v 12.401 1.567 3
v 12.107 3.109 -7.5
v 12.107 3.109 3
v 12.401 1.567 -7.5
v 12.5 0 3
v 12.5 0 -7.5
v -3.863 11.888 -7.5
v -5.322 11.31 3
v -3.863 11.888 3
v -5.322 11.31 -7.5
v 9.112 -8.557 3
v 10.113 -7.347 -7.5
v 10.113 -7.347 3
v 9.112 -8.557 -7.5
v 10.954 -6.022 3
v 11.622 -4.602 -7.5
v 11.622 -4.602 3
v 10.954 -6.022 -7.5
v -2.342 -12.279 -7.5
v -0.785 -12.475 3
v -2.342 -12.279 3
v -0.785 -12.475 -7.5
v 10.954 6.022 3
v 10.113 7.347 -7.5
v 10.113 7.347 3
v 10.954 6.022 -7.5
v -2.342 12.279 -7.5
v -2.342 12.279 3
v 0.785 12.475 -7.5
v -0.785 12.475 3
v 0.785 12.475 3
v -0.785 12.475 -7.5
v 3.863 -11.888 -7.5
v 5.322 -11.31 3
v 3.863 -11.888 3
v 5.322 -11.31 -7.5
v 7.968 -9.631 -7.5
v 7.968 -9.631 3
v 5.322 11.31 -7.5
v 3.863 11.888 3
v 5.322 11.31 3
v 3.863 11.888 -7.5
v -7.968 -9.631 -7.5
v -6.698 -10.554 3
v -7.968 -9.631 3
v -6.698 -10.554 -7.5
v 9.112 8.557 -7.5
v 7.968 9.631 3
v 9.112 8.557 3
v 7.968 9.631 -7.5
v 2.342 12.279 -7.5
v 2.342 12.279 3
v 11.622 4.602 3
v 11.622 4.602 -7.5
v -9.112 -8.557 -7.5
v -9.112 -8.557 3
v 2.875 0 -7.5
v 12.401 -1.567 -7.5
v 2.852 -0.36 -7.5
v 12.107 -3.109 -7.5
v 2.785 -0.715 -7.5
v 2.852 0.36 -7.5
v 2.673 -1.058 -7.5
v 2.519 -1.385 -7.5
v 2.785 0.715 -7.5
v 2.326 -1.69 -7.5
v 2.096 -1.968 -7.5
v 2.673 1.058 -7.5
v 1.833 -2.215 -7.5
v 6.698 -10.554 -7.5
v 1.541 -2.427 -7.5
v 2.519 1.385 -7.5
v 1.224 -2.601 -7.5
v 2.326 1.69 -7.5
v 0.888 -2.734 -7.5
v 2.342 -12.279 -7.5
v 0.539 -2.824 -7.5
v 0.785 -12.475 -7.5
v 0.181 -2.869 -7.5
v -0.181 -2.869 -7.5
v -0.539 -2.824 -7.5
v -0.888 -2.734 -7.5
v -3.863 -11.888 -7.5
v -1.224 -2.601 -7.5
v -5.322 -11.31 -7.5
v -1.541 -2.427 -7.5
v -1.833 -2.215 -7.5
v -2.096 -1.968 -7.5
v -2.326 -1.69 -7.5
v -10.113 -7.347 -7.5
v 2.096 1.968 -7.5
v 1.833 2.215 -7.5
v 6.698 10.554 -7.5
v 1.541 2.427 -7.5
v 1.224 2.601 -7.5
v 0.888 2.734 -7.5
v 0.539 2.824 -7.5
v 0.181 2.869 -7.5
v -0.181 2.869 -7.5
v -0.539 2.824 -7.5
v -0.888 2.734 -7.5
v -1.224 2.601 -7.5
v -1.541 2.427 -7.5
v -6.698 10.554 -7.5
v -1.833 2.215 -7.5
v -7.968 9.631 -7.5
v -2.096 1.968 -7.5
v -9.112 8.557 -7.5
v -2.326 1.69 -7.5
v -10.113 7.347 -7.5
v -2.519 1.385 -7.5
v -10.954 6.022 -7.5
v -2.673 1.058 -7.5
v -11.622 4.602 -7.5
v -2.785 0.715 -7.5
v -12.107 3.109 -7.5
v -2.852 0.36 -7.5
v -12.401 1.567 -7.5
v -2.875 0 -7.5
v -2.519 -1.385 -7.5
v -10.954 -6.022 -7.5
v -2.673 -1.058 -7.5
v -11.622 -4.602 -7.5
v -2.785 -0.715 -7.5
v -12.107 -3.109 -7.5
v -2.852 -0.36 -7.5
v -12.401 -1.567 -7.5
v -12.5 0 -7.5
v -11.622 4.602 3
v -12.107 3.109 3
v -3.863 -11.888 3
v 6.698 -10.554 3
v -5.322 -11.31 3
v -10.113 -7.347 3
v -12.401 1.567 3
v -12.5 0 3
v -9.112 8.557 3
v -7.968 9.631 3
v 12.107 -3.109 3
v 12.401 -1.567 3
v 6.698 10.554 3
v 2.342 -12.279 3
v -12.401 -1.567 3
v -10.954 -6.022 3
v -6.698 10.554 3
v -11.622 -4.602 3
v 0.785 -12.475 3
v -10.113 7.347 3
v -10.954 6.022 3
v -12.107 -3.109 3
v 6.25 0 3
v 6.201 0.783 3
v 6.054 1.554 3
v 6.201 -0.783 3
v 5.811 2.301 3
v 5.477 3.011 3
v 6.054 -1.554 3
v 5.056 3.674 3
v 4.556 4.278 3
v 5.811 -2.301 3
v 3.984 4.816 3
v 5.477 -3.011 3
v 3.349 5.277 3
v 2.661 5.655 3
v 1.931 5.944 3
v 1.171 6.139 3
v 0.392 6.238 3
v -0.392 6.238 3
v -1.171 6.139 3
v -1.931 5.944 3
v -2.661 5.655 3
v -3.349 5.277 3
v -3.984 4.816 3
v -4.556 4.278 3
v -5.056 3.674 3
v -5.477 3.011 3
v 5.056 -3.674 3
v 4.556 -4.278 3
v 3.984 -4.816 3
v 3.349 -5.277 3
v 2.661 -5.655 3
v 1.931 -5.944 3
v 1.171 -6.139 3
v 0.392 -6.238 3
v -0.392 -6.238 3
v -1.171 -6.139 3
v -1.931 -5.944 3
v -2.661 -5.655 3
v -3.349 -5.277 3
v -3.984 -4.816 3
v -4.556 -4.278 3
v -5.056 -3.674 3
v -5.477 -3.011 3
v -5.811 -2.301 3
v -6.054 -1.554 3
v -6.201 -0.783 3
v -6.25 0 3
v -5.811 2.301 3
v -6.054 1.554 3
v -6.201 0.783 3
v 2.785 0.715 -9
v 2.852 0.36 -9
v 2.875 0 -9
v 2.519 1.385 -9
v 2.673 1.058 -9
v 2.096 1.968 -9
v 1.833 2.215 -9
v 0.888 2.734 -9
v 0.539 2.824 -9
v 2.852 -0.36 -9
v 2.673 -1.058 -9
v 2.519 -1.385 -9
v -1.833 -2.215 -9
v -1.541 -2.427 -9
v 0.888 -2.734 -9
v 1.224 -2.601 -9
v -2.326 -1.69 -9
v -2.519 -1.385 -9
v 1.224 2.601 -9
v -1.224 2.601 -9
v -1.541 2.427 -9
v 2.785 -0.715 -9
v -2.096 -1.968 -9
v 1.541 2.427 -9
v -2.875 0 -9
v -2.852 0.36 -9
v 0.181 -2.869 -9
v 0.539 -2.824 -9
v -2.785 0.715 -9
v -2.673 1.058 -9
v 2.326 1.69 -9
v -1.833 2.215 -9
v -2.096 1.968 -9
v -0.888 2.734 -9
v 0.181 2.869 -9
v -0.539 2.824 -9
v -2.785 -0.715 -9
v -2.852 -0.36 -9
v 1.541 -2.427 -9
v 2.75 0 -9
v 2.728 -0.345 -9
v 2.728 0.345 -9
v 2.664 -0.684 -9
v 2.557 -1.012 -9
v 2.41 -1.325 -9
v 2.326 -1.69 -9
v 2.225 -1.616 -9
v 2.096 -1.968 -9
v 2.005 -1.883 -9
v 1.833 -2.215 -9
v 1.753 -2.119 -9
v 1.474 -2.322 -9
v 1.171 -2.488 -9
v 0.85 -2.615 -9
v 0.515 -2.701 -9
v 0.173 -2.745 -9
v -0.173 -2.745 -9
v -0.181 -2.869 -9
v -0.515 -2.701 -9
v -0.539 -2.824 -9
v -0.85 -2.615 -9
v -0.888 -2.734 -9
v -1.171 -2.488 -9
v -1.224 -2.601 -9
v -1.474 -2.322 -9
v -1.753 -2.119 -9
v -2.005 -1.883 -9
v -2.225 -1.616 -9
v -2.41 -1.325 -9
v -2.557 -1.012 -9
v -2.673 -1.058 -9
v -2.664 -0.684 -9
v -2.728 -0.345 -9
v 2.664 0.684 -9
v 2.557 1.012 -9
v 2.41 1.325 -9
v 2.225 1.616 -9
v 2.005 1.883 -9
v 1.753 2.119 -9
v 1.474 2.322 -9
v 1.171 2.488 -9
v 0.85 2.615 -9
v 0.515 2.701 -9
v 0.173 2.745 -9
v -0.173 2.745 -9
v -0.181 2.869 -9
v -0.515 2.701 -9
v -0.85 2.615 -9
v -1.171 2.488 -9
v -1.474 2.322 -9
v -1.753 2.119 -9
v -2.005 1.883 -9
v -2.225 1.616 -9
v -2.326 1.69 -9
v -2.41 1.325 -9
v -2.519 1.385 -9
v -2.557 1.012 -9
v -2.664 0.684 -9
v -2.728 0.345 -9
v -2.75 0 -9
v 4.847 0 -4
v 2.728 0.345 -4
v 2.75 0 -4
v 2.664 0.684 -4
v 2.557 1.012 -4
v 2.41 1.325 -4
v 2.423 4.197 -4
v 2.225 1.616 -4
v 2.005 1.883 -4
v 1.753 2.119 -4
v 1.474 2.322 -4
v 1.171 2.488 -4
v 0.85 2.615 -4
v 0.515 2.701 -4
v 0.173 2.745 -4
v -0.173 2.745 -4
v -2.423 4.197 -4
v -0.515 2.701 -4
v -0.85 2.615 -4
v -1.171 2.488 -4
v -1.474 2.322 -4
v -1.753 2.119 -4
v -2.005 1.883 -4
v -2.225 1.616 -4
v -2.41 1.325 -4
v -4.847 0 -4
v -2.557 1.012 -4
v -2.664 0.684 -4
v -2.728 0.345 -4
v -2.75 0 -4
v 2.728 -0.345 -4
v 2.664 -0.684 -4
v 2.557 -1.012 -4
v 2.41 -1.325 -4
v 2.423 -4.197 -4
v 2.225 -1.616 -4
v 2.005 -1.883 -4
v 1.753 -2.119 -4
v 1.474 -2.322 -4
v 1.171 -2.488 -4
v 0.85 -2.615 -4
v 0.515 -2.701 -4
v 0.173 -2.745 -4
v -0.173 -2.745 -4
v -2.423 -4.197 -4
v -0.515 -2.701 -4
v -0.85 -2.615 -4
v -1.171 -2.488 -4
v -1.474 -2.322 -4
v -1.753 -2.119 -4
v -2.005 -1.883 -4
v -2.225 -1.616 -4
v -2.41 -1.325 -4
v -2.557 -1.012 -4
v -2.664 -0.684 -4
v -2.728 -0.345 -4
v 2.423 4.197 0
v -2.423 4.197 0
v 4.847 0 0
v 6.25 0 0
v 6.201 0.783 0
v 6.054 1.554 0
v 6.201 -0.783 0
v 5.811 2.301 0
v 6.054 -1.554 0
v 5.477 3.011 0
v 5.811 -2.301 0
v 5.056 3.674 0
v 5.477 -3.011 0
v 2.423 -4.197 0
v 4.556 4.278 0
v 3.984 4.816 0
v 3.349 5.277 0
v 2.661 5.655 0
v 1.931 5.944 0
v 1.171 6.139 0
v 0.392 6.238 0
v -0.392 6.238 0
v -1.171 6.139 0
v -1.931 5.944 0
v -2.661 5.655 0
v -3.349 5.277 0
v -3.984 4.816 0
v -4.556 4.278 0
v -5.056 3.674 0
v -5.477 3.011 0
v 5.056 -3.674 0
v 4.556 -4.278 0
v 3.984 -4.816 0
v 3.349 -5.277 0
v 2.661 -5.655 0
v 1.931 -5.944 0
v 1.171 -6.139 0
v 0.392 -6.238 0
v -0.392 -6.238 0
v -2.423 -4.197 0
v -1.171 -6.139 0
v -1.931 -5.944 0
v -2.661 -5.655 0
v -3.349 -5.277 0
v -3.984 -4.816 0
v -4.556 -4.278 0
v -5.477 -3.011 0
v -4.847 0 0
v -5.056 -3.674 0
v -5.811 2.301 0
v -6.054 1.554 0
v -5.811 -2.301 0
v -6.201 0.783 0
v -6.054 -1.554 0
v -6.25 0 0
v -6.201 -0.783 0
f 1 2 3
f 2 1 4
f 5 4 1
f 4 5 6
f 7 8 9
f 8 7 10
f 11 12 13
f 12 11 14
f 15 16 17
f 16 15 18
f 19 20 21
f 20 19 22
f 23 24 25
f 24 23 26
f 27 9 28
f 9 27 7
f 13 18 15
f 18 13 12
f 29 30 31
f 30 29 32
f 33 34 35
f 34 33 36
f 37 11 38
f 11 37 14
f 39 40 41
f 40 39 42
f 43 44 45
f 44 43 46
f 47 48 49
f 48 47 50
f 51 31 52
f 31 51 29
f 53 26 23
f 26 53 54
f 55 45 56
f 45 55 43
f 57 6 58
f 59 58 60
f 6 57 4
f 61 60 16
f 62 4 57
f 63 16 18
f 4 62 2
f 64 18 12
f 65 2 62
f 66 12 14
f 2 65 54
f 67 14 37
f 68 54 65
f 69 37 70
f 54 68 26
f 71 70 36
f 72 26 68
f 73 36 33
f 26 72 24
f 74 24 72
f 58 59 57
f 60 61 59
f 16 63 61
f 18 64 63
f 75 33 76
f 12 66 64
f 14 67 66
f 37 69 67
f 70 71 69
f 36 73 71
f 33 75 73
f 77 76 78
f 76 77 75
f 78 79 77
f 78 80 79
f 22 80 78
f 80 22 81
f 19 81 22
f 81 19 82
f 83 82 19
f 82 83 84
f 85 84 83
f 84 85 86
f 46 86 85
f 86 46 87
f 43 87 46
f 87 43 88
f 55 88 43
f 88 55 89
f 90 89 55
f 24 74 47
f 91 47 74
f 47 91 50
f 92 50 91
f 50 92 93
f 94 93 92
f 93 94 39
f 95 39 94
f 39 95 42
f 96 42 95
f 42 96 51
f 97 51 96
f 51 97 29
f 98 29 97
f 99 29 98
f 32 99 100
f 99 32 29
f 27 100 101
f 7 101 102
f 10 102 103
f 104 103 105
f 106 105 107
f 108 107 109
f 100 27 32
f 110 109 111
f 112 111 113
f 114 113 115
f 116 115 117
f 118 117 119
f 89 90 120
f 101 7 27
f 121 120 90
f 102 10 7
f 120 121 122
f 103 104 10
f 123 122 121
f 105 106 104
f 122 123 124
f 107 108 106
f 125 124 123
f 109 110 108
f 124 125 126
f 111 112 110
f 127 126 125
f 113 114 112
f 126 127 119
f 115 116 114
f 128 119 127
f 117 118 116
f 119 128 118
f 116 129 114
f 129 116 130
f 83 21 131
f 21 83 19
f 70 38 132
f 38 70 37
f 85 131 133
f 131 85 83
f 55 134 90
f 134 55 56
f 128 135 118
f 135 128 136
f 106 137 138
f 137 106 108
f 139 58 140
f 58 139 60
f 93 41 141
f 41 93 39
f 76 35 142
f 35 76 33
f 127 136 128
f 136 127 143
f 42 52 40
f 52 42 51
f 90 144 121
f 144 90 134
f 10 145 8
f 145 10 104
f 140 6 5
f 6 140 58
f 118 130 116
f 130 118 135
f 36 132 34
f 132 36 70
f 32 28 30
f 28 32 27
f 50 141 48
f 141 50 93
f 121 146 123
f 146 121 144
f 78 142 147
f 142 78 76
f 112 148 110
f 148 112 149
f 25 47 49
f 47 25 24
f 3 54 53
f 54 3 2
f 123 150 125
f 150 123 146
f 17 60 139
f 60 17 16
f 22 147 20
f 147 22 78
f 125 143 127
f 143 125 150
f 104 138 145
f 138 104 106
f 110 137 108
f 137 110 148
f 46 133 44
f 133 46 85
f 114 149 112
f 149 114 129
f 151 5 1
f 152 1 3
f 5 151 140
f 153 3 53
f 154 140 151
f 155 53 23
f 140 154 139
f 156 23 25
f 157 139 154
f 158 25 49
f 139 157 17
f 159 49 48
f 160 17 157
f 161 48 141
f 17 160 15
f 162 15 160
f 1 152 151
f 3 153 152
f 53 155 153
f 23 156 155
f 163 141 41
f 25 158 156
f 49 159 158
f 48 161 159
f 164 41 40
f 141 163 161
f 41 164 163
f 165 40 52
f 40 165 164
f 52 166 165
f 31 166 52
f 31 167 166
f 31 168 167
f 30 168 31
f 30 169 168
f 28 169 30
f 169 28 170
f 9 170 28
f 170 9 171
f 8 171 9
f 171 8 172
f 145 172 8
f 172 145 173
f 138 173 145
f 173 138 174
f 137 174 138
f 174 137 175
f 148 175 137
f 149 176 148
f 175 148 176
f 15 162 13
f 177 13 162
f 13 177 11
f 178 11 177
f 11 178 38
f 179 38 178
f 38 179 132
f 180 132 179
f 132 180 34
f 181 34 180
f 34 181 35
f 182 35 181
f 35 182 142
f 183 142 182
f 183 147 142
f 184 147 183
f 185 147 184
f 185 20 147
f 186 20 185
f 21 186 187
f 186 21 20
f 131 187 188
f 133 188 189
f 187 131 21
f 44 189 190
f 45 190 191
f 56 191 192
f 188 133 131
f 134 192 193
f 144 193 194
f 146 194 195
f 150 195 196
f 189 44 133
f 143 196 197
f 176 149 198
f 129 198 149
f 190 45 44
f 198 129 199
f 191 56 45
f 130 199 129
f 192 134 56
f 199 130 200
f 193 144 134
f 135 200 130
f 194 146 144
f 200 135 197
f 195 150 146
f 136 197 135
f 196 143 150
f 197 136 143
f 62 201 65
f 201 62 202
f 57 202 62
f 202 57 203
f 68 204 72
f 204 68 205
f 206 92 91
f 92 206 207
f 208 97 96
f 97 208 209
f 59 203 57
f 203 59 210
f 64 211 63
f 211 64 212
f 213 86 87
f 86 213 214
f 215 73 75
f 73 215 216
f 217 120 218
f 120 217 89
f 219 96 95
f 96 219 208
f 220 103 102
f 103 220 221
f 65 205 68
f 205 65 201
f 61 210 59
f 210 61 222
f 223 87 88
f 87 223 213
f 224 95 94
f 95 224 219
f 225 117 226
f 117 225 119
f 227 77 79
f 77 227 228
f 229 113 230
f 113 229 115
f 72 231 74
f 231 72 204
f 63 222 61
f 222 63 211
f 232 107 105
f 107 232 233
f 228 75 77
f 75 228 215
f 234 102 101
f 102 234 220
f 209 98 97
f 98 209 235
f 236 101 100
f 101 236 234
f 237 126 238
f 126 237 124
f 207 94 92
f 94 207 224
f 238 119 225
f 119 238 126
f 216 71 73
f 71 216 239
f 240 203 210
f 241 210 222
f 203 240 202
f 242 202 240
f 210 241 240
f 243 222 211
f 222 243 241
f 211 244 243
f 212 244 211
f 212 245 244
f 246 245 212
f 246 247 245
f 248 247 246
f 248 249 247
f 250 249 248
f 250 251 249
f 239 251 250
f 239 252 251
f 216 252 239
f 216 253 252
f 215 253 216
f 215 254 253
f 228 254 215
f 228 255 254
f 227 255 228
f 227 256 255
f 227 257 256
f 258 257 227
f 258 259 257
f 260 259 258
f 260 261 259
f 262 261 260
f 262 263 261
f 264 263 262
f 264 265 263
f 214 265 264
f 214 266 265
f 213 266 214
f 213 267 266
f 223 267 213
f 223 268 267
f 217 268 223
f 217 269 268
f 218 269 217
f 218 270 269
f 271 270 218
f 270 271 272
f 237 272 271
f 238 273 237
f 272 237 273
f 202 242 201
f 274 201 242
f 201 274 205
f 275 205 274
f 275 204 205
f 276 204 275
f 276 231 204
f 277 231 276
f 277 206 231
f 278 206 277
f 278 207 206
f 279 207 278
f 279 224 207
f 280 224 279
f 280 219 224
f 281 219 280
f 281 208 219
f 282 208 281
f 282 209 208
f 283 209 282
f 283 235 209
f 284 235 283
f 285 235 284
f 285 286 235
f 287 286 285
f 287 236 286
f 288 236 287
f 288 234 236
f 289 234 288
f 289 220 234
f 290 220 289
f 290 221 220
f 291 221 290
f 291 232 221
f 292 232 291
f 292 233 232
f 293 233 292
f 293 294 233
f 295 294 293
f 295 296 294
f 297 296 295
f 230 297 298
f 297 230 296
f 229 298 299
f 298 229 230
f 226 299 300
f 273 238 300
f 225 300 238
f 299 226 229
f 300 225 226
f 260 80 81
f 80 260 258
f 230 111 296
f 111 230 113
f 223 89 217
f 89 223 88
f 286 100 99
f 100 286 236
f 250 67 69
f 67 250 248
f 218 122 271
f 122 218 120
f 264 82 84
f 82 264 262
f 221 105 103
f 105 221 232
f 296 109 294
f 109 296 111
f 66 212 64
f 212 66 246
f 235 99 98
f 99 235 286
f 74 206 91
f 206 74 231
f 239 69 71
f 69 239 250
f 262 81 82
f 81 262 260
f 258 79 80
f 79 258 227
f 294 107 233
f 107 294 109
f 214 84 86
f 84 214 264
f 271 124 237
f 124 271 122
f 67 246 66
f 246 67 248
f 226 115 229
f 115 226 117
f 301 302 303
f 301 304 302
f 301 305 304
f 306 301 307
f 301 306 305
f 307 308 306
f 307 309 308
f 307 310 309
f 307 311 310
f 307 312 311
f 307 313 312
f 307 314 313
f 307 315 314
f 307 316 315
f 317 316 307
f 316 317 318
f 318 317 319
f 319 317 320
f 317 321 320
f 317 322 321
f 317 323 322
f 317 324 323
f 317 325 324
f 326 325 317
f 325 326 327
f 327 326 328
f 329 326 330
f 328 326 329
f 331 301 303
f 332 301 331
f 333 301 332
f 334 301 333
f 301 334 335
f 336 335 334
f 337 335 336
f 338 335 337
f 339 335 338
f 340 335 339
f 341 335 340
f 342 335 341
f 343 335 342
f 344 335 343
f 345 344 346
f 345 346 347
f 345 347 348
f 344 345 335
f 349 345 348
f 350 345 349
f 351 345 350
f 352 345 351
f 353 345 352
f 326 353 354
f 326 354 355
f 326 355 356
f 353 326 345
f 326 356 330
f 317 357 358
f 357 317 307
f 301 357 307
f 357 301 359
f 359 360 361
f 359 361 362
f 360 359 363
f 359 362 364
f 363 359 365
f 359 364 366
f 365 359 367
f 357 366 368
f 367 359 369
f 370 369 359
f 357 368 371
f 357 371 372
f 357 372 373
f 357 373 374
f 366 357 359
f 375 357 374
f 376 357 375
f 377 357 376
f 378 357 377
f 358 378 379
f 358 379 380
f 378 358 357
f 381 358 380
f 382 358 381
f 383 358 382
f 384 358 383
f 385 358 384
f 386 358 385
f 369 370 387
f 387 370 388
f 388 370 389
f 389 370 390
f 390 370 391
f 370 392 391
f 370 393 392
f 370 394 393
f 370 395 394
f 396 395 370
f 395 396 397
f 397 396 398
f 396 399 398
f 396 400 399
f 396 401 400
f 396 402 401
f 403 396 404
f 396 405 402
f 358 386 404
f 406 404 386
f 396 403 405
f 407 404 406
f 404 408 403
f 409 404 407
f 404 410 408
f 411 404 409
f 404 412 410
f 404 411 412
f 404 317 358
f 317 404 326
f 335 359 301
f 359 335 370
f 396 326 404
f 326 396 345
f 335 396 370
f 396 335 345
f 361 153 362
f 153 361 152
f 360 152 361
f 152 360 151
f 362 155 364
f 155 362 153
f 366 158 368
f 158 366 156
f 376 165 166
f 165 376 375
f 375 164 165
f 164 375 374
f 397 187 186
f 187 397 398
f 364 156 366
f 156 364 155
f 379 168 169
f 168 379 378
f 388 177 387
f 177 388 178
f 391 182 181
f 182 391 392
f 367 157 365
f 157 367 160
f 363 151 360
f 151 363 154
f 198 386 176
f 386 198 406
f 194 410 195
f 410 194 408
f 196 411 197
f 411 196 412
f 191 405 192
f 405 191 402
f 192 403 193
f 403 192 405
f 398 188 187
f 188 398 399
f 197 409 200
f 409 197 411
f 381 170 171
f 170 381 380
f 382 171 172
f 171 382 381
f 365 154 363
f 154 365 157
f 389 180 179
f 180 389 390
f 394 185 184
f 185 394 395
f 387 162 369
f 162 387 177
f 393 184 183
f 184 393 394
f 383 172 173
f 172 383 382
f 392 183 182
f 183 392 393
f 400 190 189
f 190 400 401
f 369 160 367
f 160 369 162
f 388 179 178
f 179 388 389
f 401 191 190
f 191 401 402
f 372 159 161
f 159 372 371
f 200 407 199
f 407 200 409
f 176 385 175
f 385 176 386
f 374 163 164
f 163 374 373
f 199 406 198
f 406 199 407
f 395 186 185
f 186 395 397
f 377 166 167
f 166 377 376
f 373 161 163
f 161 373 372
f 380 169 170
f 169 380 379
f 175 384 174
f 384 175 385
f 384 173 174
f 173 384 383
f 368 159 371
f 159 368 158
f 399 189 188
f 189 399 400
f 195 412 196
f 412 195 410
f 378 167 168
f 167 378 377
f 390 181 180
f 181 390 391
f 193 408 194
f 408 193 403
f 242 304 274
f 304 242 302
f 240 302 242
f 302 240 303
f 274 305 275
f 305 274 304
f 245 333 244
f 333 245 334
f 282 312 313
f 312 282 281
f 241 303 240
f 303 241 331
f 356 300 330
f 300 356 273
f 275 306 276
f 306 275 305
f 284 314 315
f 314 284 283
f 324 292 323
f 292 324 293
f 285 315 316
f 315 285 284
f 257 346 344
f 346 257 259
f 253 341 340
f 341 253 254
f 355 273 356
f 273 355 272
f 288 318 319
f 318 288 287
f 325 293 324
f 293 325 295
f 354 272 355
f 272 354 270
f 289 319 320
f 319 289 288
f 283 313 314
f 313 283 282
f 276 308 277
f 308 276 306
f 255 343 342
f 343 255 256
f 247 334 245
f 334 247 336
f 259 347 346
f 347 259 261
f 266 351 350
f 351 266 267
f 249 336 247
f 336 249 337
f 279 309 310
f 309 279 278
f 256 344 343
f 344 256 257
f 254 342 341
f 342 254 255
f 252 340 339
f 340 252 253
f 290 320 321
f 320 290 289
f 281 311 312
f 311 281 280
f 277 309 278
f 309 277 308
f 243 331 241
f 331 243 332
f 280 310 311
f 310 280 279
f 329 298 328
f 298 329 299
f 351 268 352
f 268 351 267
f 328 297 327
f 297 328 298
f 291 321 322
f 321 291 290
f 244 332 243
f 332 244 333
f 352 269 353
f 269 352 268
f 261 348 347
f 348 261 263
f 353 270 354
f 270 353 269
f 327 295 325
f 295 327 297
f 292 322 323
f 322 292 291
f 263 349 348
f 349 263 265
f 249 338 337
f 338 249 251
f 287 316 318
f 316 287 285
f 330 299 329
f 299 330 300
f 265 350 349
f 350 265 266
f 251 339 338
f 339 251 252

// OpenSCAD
$fn = 50;


difference() {
	union() {
		translate(v = [0, 0, -7.5000000000]) {
			cylinder(h = 10.5000000000, r = 12.5000000000);
		}
		#translate(v = [0, 0, -9.0000000000]) {
			cylinder(h = 9, r = 2.8750000000);
		}
	}
	union() {
		translate(v = [0, 0, 0]) {
			rotate(a = [0, 0, 0]) {
				difference() {
					union() {
						translate(v = [0, 0, -4]) {
							linear_extrude(height = 4) {
								polygon(points = [[4.8468000000, 0.0000000000], [2.4234000000, 4.1974519271], [-2.4234000000, 4.1974519271], [-4.8468000000, 0.0000000000], [-2.4234000000, -4.1974519271], [2.4234000000, -4.1974519271]]);
							}
						}
					}
					union();
				}
			}
		}
		#cylinder(h = 3, r = 6.2500000000);
		#translate(v = [0, 0, -100.0000000000]) {
			cylinder(h = 200, r = 2.7500000000);
		}
	}
}
